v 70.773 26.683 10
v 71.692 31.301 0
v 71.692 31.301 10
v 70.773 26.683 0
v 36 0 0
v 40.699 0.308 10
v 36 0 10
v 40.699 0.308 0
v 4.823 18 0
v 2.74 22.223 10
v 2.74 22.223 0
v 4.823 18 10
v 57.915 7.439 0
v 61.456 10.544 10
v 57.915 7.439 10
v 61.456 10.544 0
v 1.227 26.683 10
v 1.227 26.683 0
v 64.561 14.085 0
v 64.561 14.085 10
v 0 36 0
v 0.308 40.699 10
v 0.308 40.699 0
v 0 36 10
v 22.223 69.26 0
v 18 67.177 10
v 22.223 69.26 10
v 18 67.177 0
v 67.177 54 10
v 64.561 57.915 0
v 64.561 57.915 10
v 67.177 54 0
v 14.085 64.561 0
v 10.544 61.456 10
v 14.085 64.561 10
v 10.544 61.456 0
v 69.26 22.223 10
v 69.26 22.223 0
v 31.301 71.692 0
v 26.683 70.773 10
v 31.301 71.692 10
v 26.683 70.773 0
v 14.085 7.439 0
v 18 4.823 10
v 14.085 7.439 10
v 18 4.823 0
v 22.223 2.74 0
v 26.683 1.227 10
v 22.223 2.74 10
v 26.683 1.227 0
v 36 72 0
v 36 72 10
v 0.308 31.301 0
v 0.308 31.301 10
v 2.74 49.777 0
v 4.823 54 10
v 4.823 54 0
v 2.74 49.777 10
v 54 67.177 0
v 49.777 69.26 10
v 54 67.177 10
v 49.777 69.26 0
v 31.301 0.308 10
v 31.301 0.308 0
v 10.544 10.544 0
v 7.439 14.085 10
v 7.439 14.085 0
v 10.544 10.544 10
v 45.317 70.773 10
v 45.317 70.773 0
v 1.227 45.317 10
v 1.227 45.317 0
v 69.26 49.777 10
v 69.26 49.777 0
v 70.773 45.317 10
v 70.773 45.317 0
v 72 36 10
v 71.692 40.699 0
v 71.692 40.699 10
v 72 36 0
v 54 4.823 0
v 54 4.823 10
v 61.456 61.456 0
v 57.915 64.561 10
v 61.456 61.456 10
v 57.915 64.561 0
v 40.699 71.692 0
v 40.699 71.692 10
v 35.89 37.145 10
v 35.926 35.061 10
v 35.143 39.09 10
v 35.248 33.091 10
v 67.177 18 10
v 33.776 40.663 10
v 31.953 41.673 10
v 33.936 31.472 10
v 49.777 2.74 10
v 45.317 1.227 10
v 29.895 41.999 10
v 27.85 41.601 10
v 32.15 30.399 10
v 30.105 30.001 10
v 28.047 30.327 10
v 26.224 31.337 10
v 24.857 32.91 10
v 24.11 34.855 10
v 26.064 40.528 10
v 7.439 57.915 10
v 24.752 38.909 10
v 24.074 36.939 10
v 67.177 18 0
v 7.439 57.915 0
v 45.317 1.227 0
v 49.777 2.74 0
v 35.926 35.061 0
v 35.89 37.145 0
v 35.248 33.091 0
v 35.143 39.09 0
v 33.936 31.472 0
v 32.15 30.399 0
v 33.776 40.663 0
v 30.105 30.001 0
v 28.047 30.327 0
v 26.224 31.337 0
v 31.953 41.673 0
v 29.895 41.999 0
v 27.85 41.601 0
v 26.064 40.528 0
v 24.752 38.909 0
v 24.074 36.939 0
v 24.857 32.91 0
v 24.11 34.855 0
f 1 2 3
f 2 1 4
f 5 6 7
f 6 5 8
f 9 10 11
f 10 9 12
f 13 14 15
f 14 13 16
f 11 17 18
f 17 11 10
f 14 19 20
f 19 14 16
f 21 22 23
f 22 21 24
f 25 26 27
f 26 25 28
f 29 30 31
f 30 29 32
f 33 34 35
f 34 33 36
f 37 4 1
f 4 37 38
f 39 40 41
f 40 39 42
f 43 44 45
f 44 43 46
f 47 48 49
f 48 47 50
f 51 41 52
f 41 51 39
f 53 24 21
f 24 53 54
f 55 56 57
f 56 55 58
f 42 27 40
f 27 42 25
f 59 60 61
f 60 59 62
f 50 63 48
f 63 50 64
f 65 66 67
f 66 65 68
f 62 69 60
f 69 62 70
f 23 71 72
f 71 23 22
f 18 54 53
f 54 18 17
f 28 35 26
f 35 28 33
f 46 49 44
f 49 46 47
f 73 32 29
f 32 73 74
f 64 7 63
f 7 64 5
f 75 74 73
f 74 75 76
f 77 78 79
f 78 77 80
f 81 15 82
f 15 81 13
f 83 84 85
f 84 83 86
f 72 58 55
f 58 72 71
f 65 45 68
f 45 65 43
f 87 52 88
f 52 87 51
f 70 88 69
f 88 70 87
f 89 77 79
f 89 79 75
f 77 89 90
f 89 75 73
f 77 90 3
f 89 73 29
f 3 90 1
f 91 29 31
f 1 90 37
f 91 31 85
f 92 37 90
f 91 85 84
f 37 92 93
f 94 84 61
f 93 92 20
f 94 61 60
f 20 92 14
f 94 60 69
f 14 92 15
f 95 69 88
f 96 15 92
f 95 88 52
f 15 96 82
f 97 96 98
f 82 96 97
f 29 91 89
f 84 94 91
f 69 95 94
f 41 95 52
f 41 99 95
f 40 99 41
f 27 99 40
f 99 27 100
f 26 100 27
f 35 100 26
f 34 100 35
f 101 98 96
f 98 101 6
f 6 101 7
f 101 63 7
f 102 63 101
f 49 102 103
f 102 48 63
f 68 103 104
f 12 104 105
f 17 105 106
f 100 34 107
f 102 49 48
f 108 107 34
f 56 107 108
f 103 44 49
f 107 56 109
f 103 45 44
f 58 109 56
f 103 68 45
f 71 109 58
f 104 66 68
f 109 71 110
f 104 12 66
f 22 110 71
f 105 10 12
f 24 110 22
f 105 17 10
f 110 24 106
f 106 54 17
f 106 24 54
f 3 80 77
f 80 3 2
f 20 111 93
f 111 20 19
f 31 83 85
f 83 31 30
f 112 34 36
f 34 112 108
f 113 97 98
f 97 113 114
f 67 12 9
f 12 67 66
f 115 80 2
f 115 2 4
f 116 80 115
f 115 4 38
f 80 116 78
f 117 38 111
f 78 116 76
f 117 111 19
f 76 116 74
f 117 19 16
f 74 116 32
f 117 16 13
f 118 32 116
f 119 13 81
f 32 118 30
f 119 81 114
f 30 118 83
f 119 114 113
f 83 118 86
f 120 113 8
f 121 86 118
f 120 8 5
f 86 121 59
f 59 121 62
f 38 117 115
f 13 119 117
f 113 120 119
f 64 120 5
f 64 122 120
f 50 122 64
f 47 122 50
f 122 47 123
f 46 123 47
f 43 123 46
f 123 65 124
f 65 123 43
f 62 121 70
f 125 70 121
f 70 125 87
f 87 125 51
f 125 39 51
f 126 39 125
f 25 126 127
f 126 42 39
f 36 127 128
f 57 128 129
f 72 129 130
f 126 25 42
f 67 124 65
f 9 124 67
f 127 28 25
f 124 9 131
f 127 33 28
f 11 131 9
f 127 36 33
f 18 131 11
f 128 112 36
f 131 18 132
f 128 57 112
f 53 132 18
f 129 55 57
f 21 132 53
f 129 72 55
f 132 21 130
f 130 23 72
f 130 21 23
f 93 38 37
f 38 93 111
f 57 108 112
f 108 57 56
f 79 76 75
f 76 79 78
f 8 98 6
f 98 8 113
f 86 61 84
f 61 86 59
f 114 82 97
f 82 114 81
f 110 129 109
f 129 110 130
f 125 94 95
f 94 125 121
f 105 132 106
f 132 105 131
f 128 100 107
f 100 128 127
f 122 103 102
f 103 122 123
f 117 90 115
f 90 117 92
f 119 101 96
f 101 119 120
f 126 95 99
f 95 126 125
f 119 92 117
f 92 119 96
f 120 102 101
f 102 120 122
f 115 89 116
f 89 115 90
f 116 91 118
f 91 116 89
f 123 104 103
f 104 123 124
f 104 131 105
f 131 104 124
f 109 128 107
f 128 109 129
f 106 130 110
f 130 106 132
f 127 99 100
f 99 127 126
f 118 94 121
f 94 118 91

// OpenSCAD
$fn = 32;

// ----------------------------------------------------------------------
// Cam plate: eccentric cam, base R36
// ----------------------------------------------------------------------

// --- parameters (mm) ---
base_r = 36;              // base circle radius
lobe_h = 10;              // cam lobe rise
bore_r = 6;               // shaft bore radius
plate_t = 10;             // plate thickness, Z (extrusion height)
ecc = 6;                  // disc eccentricity

profile = [[72, 36], [71.692, 40.699], [70.773, 45.317], [69.26, 49.777], [67.177, 54], [64.561, 57.915], [61.456, 61.456], [57.915, 64.561], [54, 67.177], [49.777, 69.26], [45.317, 70.773], [40.699, 71.692], [36, 72], [31.301, 71.692], [26.683, 70.773], [22.223, 69.26], [18, 67.177], [14.085, 64.561], [10.544, 61.456], [7.439, 57.915], [4.823, 54], [2.74, 49.777], [1.227, 45.317], [0.308, 40.699], [0, 36], [0.308, 31.301], [1.227, 26.683], [2.74, 22.223], [4.823, 18], [7.439, 14.085], [10.544, 10.544], [14.085, 7.439], [18, 4.823], [22.223, 2.74], [26.683, 1.227], [31.301, 0.308], [36, 0], [40.699, 0.308], [45.317, 1.227], [49.777, 2.74], [54, 4.823], [57.915, 7.439], [61.456, 10.544], [64.561, 14.085], [67.177, 18], [69.26, 22.223], [70.773, 26.683], [71.692, 31.301]];  // primary outline, 48 points, counter clockwise
void_1 = [[35.89, 37.145], [35.143, 39.09], [33.776, 40.663], [31.953, 41.673], [29.895, 41.999], [27.85, 41.601], [26.064, 40.528], [24.752, 38.909], [24.074, 36.939], [24.11, 34.855], [24.857, 32.91], [26.224, 31.337], [28.047, 30.327], [30.105, 30.001], [32.15, 30.399], [33.936, 31.472], [35.248, 33.091], [35.926, 35.061]];  // shaft bore, 18 points

// --- the one profile operation ---
difference() {
  linear_extrude(height = plate_t) polygon(points = profile);
  translate([0, 0, -1])
    linear_extrude(height = plate_t + 2) polygon(points = void_1);
}
